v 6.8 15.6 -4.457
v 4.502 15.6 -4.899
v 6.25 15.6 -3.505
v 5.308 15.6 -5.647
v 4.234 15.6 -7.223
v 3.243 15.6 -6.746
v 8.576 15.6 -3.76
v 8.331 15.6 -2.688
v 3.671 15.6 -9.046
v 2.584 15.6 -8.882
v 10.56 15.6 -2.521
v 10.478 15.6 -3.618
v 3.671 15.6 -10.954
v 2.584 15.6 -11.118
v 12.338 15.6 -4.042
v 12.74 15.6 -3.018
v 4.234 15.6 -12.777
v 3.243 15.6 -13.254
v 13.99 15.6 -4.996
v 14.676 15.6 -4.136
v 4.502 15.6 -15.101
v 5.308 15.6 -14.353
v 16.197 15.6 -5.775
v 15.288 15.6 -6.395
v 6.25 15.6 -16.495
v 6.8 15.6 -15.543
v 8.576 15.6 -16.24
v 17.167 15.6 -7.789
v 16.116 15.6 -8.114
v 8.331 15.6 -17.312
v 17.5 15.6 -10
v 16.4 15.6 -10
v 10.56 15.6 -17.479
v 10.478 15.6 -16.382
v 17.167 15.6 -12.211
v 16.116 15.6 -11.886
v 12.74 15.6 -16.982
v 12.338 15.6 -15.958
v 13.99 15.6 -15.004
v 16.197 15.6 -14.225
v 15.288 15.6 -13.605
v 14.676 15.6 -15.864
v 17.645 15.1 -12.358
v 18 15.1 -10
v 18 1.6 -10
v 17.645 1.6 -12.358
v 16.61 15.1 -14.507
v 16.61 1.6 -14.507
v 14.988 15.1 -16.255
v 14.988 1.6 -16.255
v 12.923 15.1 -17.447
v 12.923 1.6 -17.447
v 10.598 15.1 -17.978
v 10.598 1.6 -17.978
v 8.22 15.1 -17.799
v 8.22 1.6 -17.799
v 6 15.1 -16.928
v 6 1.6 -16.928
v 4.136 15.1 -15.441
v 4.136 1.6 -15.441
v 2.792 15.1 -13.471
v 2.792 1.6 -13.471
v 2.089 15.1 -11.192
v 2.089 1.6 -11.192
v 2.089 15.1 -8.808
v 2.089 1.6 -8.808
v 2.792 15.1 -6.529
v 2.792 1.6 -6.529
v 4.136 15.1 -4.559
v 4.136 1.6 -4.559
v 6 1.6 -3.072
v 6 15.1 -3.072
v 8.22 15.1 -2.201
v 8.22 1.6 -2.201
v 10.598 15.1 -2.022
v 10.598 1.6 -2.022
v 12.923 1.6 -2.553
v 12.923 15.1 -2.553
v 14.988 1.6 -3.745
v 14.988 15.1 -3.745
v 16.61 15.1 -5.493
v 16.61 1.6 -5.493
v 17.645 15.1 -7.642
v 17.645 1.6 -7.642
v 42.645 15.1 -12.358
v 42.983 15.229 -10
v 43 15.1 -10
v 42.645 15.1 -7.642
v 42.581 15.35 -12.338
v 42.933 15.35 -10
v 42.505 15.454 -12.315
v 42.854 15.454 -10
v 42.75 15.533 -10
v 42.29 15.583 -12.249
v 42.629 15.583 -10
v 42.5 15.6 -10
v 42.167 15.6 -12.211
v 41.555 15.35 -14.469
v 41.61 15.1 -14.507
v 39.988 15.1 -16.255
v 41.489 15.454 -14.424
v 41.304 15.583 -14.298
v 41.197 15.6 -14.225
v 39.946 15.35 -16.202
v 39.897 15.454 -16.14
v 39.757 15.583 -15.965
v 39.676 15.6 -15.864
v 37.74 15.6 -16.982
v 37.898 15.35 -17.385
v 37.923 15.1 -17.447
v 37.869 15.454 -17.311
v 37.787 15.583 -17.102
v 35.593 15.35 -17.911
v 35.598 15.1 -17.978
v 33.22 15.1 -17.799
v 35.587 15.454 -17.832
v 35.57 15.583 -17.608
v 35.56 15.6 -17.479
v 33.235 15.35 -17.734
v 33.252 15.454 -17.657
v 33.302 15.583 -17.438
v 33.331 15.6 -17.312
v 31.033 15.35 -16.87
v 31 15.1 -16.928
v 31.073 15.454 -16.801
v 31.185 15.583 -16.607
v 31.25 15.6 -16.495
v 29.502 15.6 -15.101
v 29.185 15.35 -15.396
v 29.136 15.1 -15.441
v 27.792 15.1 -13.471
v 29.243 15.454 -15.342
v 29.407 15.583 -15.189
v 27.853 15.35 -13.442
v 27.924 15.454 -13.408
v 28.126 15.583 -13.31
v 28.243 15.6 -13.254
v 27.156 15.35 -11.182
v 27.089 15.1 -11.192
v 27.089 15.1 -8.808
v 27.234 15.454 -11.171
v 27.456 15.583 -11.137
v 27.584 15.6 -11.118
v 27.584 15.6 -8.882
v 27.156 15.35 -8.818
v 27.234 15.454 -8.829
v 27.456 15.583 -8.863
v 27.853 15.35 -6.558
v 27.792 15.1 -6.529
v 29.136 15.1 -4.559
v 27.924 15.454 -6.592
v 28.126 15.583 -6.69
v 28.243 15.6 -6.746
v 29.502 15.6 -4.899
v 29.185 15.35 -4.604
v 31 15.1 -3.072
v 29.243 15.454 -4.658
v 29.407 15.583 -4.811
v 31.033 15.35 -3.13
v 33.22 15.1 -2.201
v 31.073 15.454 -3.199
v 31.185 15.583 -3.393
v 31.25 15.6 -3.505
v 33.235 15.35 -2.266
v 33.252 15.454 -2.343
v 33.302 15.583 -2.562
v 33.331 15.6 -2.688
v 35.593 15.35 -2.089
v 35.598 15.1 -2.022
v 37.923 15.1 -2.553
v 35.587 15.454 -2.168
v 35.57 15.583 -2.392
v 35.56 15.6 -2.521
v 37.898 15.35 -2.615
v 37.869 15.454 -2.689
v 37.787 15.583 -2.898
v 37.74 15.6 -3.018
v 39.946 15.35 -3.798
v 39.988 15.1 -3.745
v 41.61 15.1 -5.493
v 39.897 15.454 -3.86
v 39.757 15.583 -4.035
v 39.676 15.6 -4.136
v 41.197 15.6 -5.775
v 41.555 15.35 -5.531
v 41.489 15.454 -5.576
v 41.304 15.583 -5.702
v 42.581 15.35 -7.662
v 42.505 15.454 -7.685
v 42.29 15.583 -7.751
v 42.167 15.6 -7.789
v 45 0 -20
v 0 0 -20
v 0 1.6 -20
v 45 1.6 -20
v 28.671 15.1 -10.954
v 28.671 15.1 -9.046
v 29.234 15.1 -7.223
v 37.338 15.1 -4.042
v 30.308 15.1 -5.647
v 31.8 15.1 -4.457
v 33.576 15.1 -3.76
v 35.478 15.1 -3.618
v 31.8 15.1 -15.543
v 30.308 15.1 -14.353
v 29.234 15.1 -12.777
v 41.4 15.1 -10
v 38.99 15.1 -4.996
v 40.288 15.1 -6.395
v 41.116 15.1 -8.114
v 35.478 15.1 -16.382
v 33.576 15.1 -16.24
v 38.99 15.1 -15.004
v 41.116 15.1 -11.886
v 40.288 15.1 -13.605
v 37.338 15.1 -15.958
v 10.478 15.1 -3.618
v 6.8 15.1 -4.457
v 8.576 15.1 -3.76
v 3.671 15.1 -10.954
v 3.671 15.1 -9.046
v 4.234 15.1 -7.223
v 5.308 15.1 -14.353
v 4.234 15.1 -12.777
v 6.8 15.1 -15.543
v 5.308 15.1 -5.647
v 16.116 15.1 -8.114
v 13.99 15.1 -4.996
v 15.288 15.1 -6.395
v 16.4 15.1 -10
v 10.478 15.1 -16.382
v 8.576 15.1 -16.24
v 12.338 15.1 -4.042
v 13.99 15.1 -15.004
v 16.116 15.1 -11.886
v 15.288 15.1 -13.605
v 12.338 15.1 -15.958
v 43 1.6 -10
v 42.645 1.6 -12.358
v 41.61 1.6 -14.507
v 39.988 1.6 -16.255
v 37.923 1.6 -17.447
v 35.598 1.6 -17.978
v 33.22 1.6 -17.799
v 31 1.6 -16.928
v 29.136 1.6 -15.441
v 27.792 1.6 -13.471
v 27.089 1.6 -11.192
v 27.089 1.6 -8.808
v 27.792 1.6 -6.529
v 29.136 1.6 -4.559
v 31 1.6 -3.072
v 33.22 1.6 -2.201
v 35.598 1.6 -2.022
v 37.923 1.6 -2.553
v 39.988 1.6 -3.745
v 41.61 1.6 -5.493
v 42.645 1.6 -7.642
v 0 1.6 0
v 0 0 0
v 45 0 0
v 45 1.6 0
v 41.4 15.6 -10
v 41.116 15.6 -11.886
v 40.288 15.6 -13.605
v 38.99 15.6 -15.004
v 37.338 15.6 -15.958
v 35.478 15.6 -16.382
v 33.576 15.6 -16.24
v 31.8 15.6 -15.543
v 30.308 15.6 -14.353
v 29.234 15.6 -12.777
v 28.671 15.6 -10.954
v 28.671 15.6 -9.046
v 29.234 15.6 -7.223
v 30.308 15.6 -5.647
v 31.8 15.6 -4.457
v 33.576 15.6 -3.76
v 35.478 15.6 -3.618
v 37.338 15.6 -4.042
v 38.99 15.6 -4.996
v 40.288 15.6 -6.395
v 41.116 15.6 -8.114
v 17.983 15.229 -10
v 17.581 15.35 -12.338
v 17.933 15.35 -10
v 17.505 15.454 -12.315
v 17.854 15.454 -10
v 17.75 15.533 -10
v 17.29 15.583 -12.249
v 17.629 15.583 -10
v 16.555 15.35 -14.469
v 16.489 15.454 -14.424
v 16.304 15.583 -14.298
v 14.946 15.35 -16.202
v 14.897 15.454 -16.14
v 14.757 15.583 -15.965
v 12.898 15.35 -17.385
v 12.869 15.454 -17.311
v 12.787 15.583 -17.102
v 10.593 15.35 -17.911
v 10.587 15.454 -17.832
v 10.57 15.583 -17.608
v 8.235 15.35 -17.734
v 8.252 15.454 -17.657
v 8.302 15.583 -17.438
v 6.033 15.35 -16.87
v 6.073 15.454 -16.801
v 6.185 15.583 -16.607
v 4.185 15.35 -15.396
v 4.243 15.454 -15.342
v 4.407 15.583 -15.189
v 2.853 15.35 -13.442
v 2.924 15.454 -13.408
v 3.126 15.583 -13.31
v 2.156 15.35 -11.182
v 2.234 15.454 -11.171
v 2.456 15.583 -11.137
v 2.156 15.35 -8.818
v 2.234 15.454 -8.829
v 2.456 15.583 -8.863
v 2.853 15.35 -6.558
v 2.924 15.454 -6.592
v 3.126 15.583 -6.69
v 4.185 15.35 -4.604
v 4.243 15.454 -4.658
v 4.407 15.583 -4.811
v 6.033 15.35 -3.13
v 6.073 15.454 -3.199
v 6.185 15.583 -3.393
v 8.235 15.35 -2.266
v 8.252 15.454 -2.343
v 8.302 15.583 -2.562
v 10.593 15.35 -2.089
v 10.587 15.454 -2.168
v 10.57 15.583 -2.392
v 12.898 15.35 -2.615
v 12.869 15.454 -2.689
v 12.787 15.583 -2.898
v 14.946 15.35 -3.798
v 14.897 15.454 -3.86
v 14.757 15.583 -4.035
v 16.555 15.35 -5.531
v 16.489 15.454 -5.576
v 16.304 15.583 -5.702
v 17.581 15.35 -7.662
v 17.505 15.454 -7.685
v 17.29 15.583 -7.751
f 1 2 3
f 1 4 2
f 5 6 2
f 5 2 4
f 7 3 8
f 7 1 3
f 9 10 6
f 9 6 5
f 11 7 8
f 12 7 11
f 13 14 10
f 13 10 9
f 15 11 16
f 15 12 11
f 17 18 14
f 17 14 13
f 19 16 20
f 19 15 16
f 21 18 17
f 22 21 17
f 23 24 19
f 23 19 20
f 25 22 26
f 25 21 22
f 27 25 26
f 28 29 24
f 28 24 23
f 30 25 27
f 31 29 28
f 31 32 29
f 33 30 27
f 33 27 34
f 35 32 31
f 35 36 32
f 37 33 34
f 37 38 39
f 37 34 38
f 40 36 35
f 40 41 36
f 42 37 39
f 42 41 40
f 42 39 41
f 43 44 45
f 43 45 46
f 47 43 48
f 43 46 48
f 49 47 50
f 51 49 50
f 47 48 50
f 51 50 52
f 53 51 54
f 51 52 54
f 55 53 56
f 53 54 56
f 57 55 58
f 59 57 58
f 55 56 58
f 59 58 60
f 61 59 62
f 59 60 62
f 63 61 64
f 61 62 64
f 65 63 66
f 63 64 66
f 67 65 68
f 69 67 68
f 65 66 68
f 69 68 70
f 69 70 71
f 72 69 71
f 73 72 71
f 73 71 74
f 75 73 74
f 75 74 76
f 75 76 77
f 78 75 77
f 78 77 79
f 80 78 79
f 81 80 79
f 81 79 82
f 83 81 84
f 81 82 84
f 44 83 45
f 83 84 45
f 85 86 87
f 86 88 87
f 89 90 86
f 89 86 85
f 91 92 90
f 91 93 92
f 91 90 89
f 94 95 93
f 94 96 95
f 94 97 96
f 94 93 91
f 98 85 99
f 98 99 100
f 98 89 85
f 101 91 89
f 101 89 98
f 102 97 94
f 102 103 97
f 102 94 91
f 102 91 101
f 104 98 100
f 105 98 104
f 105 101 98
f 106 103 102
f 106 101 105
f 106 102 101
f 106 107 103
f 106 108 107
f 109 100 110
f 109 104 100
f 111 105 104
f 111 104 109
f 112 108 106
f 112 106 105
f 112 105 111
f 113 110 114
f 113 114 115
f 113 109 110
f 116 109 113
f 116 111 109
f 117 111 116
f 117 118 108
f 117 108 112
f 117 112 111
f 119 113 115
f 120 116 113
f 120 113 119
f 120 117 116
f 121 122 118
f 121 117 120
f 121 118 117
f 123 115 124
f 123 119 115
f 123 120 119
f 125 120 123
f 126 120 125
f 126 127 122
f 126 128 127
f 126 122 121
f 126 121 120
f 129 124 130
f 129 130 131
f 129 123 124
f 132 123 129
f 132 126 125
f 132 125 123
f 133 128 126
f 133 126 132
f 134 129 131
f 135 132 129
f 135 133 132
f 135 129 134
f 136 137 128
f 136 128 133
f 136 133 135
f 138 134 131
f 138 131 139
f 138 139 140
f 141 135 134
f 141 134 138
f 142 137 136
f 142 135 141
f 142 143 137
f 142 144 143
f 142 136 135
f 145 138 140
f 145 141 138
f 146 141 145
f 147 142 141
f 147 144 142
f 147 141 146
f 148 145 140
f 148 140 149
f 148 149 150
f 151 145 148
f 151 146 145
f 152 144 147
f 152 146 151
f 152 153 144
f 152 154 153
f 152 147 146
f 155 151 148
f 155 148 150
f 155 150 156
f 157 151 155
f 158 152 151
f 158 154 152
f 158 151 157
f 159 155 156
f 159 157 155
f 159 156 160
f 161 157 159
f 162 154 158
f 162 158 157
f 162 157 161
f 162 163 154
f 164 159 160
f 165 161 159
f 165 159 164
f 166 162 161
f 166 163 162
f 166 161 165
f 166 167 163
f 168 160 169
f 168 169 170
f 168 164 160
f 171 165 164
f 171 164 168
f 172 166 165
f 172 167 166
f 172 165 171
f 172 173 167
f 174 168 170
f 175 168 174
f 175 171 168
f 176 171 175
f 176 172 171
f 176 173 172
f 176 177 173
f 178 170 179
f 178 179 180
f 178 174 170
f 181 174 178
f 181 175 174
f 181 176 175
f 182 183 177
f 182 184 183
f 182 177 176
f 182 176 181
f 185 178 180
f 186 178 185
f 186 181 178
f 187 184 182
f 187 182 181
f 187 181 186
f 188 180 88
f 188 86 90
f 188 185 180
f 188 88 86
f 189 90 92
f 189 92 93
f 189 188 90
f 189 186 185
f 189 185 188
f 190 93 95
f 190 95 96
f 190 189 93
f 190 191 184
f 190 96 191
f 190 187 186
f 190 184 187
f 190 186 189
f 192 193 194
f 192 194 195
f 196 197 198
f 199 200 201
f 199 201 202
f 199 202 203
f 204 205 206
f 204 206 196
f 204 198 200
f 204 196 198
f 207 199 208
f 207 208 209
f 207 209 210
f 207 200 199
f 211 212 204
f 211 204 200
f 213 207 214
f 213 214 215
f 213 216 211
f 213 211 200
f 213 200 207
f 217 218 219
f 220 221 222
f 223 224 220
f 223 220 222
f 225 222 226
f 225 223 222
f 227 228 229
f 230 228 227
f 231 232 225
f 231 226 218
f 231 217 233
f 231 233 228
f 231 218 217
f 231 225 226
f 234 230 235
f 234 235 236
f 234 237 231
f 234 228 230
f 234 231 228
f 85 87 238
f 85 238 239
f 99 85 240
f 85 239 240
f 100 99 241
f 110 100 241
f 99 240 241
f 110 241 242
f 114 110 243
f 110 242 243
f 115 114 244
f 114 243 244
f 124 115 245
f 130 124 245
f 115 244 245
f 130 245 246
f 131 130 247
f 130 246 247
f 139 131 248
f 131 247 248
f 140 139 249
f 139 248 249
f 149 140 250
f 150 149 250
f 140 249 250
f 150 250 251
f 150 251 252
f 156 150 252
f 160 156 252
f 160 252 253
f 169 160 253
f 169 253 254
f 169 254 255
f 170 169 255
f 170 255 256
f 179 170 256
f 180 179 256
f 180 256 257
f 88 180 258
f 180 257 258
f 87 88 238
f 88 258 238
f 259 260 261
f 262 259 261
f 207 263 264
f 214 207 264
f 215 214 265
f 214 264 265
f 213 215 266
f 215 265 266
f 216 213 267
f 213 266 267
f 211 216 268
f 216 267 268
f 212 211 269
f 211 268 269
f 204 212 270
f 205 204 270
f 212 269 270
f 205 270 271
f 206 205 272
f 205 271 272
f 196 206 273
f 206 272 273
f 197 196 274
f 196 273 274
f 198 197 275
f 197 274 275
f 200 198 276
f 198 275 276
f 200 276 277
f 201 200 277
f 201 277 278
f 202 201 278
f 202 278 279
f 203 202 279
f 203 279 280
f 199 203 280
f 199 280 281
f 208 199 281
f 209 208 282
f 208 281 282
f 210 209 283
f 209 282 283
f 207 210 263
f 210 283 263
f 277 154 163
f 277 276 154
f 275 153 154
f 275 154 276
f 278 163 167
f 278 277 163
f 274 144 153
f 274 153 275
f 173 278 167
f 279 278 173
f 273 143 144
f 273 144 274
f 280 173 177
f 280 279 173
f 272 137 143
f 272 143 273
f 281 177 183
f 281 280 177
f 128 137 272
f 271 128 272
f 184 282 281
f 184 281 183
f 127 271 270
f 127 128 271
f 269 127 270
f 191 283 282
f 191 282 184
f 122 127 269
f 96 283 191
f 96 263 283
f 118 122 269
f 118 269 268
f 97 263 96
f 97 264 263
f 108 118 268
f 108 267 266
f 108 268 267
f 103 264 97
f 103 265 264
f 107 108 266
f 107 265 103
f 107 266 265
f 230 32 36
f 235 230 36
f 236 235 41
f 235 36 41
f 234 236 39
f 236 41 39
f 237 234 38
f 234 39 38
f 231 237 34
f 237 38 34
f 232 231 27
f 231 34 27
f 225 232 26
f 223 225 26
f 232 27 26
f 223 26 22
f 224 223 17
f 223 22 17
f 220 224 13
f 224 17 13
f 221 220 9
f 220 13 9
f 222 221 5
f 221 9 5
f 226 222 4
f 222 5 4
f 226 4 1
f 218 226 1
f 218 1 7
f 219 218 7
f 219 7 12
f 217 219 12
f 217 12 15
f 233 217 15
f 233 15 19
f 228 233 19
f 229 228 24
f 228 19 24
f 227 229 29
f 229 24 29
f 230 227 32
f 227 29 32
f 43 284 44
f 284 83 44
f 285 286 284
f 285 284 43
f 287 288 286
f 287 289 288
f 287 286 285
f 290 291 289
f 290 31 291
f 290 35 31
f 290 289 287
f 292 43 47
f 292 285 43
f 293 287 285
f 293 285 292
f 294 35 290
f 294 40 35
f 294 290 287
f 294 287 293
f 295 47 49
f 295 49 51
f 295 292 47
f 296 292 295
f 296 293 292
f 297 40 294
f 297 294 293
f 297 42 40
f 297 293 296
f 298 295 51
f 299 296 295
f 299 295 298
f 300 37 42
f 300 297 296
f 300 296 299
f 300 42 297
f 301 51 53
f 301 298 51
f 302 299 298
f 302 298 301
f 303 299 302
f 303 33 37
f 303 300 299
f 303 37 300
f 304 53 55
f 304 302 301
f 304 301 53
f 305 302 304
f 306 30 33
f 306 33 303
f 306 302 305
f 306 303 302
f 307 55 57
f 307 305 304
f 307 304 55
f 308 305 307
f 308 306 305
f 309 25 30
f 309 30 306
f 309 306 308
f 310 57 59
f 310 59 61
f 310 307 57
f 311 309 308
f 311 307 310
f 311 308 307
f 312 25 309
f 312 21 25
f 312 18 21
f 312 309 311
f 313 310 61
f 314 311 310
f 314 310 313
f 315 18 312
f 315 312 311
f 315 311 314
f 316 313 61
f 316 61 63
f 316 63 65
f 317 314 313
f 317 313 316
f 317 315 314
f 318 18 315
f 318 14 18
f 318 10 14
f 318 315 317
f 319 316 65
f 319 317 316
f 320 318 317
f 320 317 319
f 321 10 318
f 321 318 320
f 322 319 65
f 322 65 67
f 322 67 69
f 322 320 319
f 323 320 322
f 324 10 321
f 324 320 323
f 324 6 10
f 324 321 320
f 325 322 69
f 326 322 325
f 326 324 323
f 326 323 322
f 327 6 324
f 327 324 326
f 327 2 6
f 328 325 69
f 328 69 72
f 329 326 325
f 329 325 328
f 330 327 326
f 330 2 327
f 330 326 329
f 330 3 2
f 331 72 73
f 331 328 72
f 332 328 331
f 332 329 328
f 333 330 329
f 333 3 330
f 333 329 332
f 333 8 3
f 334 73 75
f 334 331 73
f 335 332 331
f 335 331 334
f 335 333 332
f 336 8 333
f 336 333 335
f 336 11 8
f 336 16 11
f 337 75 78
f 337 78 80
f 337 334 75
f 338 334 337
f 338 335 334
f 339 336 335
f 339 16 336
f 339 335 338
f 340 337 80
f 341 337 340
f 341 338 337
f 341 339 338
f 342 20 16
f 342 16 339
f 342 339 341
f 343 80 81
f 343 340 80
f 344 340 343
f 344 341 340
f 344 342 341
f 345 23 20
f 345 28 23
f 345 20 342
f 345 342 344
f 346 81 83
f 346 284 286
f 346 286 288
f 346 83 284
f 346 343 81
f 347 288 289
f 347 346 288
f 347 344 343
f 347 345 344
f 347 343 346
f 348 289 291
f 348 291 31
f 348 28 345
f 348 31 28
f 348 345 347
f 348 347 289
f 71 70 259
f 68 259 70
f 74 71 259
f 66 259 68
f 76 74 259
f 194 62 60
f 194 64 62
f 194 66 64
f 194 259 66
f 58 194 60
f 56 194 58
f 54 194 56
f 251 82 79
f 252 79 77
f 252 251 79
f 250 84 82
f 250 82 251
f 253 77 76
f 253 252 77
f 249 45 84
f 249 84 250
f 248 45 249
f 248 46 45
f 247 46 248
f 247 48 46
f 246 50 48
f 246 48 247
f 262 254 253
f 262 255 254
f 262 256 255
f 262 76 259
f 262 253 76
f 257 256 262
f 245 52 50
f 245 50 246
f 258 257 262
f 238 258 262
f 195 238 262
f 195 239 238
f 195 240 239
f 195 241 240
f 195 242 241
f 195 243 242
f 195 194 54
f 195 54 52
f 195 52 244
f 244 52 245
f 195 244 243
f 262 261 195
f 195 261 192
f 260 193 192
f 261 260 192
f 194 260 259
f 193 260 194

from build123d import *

# Parameters (mm, degrees)
SKETCH1_W           = 45
SKETCH1_H           = 20
BOSS_EXTRUDE1_DEPTH = 1.6
SKETCH2_R           = 8
BOSS_EXTRUDE2_DEPTH = 14
SKETCH3_R           = 6.4
CUT_EXTRUDE1_DEPTH  = 0.5
FILLET1_R           = 0.5


with BuildPart() as part:
    # Sketch1 → Boss-Extrude1 (new body)
    with BuildSketch(Plane(origin=(0, 0, 0), x_dir=(1, 0, 0), z_dir=(0, 1, 0))):
        with Locations((22.5, 10)):
            Rectangle(SKETCH1_W, SKETCH1_H)
    extrude(amount=BOSS_EXTRUDE1_DEPTH)

    # Sketch2 → Boss-Extrude2 (add)
    with BuildSketch(Plane(origin=(0, 1.6, 0), x_dir=(1, 0, 0), z_dir=(0, 1, 0))):
        with Locations((10, 10)):
            Circle(SKETCH2_R)
        with Locations((35, 10)):
            Circle(SKETCH2_R)
    extrude(amount=BOSS_EXTRUDE2_DEPTH)

    # Sketch3 → Cut-Extrude1 (cut)
    with BuildSketch(Plane(origin=(0, 15.6, 0), x_dir=(1, 0, 0), z_dir=(0, 1, 0))):
        with Locations((10, 10)):
            Circle(SKETCH3_R)
        with Locations((35, 10)):
            Circle(SKETCH3_R)
    extrude(amount=-CUT_EXTRUDE1_DEPTH, mode=Mode.SUBTRACT)

    # Fillet1
    fillet1_edges = [part.edges().sort_by_distance(p)[0] for p in [
        (2, 15.6, -10),
        (27, 15.6, -10),
    ]]
    fillet(fillet1_edges, radius=FILLET1_R)


solid = part.part
